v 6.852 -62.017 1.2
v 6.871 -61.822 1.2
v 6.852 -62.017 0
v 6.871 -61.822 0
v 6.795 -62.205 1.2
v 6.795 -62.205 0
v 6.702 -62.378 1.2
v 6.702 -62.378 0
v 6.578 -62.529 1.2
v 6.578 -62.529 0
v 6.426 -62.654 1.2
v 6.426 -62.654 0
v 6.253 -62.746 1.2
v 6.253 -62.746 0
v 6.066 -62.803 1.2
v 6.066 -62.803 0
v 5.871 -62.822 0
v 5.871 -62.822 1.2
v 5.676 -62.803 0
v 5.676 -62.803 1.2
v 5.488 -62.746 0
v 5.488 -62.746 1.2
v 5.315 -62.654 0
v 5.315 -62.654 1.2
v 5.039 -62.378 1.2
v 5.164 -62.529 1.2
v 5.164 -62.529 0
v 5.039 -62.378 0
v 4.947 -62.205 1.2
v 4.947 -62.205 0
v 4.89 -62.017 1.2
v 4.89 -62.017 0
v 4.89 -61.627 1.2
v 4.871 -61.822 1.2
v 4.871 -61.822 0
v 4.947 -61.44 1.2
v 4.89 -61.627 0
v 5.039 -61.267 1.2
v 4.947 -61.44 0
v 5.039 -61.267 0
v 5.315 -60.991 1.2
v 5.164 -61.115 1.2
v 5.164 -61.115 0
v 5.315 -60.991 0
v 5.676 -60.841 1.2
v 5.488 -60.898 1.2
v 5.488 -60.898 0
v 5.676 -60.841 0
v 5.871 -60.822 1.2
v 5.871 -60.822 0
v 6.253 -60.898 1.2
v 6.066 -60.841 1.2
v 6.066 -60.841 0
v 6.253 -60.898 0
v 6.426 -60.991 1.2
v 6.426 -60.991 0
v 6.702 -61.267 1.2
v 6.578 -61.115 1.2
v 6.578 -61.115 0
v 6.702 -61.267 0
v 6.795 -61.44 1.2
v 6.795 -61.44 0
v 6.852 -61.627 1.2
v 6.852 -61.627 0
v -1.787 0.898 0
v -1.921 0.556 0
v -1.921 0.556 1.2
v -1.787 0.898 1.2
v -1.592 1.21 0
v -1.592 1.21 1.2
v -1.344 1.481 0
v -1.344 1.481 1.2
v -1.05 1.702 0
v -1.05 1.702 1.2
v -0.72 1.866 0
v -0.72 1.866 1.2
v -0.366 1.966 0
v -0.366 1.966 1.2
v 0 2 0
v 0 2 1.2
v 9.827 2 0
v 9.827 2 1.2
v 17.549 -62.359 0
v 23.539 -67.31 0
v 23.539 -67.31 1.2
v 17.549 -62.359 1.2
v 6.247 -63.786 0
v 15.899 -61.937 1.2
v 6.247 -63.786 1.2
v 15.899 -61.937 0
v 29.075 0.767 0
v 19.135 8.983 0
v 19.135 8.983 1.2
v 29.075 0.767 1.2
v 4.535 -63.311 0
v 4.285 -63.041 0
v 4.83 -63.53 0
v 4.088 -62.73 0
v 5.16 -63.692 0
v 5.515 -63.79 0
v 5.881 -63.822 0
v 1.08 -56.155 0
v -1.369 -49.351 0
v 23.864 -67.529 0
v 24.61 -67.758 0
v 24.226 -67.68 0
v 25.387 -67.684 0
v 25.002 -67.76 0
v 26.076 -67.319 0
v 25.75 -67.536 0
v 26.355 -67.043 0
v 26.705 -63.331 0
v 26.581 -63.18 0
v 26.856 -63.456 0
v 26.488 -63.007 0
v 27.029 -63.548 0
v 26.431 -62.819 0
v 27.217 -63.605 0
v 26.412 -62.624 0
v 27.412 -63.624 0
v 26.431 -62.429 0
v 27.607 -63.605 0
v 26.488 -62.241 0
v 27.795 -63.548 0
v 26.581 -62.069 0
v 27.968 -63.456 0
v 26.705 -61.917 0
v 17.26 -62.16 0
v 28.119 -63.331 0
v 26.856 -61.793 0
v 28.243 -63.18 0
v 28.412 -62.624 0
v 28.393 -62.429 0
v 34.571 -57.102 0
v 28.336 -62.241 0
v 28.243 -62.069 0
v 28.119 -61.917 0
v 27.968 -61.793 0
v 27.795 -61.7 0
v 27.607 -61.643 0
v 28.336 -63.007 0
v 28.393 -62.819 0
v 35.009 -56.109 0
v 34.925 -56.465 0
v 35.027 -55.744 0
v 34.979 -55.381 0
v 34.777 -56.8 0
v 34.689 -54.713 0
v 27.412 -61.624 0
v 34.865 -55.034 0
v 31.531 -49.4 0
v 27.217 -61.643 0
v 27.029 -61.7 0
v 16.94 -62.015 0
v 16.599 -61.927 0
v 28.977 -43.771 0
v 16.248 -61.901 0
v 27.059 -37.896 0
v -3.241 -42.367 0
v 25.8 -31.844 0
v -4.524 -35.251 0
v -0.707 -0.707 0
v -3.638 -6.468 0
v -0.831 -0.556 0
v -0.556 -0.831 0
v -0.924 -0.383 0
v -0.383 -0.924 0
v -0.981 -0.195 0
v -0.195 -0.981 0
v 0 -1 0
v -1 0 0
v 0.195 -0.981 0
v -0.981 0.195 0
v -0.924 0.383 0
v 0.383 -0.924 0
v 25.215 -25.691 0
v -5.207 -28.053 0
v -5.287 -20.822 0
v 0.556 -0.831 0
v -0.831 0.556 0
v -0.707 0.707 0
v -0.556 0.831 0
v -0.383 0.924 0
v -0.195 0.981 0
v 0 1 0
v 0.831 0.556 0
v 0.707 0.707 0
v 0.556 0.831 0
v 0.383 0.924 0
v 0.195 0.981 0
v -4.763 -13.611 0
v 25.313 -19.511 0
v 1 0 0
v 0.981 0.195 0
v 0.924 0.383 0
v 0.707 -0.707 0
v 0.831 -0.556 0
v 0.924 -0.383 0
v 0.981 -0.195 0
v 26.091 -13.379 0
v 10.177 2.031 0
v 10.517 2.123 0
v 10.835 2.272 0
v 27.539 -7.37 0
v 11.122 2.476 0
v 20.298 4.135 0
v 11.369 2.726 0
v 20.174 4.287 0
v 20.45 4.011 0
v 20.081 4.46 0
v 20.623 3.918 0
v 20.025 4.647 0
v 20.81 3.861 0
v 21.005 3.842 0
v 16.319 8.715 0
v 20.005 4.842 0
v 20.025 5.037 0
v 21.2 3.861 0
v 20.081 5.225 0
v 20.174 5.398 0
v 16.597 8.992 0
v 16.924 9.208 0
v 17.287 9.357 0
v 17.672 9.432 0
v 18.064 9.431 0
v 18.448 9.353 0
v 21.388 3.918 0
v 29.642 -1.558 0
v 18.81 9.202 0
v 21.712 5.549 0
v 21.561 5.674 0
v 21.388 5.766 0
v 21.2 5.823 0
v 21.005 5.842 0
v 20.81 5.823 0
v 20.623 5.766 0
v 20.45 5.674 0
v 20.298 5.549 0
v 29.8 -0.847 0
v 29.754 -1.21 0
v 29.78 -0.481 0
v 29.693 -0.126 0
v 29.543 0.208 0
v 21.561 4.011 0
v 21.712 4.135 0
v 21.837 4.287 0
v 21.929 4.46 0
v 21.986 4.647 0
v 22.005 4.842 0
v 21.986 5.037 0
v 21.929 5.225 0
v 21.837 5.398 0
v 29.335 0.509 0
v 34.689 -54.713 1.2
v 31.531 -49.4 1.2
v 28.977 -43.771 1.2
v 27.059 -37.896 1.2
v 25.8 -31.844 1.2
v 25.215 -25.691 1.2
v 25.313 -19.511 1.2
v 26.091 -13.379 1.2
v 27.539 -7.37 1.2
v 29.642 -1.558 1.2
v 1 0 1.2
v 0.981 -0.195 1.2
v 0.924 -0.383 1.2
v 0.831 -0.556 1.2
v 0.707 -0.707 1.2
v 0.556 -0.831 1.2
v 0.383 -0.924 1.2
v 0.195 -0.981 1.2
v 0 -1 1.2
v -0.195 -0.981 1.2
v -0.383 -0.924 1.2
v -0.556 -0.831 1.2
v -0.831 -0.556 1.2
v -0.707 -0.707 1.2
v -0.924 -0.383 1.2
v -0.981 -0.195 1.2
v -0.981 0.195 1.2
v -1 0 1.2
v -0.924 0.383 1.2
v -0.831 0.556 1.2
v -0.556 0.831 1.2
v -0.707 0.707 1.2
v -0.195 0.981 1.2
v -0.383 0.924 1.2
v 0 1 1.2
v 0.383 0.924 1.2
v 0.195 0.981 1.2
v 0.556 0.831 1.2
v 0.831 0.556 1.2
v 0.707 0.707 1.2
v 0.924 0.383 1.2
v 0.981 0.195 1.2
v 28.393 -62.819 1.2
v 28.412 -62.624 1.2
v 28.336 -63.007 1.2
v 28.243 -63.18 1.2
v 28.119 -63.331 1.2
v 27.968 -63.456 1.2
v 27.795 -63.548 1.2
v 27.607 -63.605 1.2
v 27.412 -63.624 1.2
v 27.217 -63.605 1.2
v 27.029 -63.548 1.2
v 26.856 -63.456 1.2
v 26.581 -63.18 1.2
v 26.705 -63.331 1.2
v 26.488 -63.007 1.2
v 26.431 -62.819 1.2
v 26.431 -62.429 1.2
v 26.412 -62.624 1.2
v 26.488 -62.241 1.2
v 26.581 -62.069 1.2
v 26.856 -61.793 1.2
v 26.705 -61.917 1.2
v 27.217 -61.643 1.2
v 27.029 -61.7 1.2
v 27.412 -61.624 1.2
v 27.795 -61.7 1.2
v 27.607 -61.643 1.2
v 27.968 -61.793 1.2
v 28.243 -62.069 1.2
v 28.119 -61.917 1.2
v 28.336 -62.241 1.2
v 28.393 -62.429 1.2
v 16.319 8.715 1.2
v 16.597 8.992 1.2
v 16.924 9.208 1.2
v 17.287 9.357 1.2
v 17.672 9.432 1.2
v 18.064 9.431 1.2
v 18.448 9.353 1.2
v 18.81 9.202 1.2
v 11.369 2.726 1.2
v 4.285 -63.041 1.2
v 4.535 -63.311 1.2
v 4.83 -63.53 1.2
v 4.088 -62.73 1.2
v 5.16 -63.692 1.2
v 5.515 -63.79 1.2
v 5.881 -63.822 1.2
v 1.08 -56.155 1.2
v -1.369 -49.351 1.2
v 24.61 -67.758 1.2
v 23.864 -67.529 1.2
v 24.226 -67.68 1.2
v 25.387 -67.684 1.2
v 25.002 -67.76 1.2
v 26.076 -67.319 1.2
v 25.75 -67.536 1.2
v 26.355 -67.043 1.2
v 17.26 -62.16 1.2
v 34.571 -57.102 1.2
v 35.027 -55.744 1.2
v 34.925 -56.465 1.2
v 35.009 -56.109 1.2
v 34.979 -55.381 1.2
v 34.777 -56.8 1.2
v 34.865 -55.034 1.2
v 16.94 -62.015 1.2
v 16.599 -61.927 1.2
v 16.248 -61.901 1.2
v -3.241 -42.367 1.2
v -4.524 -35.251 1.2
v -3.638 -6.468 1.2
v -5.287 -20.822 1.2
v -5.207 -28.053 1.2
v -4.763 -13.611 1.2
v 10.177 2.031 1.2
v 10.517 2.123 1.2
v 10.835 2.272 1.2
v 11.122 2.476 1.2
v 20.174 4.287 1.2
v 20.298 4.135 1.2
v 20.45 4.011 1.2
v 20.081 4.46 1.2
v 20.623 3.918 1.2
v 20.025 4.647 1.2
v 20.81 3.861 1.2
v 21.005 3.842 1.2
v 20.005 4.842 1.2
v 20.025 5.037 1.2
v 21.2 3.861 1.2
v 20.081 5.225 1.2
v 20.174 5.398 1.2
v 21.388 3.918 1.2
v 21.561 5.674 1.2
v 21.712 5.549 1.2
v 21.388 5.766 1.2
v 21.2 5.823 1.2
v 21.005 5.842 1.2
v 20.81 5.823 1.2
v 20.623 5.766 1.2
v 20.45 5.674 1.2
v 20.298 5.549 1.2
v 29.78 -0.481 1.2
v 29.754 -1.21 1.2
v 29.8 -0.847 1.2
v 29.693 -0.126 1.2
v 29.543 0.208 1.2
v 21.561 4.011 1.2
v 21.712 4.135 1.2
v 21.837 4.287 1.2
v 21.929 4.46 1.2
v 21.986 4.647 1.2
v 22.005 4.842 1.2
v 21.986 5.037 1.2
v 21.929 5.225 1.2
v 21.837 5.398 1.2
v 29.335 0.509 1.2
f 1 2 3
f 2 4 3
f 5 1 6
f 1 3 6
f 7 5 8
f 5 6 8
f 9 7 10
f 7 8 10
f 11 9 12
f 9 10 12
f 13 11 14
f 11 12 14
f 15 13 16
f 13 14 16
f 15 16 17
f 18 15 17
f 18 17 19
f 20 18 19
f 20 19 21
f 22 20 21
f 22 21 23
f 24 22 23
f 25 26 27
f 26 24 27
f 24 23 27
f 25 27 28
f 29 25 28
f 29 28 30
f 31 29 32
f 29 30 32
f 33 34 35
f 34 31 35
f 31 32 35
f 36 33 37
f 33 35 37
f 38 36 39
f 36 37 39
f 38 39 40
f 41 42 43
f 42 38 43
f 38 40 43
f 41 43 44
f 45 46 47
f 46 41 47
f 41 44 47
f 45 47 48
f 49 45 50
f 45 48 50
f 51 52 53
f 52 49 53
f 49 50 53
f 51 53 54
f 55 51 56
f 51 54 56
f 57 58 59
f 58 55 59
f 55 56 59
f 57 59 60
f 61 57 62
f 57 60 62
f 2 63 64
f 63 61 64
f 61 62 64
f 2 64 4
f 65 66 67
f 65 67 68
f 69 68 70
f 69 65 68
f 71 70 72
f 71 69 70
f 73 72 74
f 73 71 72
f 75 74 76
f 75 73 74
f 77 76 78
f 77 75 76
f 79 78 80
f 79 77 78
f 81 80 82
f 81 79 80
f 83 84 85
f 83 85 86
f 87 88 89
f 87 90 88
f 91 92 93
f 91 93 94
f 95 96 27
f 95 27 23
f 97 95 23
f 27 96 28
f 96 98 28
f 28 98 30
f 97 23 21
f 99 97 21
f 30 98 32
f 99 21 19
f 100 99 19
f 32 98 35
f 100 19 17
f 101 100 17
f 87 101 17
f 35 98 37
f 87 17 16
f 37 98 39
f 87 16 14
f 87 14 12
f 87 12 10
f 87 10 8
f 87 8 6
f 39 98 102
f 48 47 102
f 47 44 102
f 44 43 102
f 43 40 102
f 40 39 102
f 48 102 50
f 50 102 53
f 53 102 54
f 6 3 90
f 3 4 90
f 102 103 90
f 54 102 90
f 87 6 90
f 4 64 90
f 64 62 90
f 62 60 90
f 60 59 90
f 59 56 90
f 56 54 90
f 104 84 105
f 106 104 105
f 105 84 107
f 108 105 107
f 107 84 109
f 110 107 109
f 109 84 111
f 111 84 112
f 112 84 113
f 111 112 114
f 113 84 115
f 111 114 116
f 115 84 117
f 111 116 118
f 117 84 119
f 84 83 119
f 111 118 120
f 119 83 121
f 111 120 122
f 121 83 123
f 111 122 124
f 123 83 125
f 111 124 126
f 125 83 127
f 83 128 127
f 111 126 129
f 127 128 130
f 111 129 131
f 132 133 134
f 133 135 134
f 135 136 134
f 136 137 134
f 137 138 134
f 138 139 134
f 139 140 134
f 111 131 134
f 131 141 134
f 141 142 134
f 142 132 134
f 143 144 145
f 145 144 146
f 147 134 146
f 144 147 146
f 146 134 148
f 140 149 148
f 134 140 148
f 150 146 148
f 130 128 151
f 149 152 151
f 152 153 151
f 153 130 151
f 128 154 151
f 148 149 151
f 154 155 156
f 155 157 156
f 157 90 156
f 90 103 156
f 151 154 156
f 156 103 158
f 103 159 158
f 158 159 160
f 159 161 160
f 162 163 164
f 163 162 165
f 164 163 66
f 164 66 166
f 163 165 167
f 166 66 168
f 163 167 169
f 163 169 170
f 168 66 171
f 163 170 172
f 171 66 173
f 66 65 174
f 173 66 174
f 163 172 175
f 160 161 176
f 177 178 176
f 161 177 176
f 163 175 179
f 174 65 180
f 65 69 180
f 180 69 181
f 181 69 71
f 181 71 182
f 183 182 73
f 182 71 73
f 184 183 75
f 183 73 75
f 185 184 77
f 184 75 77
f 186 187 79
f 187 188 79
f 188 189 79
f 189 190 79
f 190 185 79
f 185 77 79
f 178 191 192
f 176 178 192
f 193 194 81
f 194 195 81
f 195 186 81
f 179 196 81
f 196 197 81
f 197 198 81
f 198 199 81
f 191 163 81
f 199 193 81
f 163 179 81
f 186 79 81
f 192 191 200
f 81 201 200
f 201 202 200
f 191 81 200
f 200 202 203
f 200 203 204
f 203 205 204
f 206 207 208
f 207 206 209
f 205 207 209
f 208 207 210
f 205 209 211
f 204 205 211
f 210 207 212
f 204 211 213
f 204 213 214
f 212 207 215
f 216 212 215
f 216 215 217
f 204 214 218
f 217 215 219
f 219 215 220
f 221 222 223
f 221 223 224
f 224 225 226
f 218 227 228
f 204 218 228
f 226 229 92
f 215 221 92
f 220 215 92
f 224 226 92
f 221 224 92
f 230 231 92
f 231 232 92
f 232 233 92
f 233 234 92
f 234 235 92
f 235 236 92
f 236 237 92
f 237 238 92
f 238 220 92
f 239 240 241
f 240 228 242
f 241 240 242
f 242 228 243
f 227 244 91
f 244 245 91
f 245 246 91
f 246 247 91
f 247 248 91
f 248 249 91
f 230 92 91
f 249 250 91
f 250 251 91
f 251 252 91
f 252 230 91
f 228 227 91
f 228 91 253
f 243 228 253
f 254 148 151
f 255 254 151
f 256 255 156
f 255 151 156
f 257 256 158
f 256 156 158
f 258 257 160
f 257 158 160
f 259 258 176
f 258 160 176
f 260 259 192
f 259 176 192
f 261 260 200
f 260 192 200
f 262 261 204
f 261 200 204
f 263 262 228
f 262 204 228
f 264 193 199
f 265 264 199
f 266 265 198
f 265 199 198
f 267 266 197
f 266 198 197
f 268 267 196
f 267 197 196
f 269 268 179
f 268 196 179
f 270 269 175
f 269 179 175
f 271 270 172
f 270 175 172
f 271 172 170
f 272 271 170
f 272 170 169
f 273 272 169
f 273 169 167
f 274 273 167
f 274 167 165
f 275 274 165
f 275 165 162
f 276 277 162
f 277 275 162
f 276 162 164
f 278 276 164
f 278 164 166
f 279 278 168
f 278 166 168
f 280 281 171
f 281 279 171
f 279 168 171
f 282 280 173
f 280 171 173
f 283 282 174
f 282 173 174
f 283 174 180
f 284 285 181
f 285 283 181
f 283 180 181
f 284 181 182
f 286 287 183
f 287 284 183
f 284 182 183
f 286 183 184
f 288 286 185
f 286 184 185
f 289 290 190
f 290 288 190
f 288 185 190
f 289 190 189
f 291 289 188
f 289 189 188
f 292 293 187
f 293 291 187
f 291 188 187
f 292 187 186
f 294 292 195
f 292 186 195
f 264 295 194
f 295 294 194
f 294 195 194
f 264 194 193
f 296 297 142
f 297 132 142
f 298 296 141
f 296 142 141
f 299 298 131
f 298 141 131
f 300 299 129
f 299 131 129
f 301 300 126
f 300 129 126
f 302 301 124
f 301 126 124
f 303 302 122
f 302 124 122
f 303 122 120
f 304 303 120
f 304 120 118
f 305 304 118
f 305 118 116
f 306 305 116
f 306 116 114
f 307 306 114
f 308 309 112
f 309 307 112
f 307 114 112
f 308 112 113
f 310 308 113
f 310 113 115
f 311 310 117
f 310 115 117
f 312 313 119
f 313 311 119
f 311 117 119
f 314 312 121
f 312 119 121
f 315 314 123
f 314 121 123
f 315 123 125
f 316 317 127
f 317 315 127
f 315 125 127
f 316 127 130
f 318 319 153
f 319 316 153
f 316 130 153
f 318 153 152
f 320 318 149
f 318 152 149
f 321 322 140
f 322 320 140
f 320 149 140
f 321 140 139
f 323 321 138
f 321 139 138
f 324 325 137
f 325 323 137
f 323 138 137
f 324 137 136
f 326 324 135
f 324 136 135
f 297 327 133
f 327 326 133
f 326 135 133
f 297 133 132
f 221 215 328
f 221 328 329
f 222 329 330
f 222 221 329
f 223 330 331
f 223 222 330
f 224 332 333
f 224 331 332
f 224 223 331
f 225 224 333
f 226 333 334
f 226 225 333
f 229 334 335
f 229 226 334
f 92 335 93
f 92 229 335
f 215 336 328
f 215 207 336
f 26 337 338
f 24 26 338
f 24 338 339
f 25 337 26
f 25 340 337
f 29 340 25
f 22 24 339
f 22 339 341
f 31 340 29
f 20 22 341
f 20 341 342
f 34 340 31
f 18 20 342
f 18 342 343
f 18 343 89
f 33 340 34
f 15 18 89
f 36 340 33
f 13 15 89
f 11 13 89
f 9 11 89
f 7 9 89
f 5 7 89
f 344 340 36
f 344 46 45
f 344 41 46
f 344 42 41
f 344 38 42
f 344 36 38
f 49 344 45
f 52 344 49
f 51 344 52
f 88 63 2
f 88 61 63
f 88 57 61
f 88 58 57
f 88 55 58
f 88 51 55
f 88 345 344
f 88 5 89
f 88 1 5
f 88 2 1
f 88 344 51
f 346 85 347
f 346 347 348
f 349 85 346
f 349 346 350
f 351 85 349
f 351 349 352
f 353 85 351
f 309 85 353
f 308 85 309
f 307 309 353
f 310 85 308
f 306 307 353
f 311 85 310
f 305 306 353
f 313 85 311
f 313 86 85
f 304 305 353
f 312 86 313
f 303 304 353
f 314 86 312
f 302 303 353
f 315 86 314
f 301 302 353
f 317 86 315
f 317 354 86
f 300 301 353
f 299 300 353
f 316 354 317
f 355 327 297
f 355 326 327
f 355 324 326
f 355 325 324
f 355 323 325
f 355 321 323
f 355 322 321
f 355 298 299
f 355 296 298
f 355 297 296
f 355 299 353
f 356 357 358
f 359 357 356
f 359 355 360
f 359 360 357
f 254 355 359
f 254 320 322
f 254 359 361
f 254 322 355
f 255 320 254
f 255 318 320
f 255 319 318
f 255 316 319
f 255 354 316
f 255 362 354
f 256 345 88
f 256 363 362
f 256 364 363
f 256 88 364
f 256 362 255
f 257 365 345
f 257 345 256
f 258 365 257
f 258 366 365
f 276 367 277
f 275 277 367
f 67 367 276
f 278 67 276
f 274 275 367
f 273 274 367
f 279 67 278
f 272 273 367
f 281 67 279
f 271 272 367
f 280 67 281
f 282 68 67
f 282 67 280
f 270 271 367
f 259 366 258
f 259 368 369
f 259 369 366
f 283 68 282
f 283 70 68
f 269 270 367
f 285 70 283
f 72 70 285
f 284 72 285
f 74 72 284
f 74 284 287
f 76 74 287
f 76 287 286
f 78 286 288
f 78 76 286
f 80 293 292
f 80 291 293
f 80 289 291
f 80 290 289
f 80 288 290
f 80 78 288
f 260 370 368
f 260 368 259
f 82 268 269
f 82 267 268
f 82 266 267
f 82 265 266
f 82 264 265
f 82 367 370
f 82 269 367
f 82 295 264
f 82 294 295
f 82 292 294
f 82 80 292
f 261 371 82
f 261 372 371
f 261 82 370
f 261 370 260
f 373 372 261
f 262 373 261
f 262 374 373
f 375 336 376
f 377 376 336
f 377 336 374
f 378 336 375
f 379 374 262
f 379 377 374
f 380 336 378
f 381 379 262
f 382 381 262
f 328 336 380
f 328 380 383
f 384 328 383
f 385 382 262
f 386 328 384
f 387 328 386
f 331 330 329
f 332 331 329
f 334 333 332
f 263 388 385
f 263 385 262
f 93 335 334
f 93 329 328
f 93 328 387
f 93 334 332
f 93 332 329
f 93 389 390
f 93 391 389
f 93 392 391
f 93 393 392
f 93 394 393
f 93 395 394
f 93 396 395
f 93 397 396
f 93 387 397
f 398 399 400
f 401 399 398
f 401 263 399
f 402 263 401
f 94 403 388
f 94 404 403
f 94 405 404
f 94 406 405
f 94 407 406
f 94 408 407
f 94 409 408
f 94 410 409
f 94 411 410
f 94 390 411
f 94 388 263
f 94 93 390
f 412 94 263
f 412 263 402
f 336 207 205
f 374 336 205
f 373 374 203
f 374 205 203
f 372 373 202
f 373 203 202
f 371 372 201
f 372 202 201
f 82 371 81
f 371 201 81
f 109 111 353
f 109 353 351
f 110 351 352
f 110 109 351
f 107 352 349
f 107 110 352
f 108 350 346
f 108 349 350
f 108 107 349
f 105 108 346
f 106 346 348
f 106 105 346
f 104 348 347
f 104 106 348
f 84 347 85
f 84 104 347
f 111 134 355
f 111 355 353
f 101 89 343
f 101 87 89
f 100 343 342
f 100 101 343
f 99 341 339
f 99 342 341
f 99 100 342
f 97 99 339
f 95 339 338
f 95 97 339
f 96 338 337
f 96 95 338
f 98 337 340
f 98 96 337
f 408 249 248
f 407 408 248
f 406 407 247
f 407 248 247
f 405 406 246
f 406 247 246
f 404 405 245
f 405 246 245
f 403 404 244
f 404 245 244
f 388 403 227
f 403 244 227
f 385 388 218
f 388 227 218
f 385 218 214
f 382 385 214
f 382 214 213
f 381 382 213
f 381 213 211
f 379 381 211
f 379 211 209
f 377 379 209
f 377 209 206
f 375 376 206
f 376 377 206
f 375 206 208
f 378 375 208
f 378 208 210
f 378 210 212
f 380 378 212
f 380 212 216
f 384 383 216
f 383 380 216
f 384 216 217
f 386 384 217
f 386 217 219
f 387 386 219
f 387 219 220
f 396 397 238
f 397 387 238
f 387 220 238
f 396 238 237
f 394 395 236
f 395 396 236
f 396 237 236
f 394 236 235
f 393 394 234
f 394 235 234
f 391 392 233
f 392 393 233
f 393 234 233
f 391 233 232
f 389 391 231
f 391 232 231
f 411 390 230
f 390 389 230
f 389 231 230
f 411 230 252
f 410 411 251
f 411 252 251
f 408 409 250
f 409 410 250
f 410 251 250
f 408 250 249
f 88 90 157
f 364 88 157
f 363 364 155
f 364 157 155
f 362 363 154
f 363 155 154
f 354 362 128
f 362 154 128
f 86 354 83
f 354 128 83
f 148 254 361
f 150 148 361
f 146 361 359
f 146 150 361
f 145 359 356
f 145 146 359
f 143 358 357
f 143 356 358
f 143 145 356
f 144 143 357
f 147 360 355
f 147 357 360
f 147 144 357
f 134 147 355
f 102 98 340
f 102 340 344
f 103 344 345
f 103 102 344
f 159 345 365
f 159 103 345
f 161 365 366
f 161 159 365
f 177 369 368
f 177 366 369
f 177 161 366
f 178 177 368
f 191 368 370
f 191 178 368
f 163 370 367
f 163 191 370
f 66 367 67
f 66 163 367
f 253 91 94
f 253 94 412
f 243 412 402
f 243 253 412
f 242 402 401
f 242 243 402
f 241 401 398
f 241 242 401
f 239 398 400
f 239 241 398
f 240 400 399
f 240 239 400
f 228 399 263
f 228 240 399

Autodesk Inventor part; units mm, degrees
ref_plane "YZ Plane" through (0, 0, 0) normal (1, 0, 0) x (0, 1, 0)
ref_plane "XZ Plane" through (0, 0, 0) normal (0, 1, 0) x (-1, 0, 0)
ref_plane "XY Plane" through (0, 0, 0) normal (0, 0, 1) x (1, 0, 0)
sketch "スケッチ1" plane through (0, 0, 0) normal (0, 0, 1) x (1, 0, 0)
  circle A0 centre (21.005288, 4.842186) radius 2
  circle A1 centre (0, 0) radius 2
  circle A2 centre (81.171801, -23.481667) radius 63
  arc A3 (-1.921226, 0.555779) -> (4.088443, -62.729672) centre (81.171801, -23.481667) ccw
  line L0 (0, 2) -> (9.827028, 2)
  line L1 (11.368602, 2.725814) -> (16.319283, 8.715397)
  line L2 (19.135043, 8.982785) -> (29.075493, 0.766521)
  line L3 (8.206239, 4.393532) -> (1.777293, 9.707368)
  line L4 (40.328272, 40.117124) -> (11.021999, 4.660921)
  arc A4 (9.827028, 2) -> (11.368602, 2.725814) centre (9.827028, 4) ccw
  arc A5 (19.135043, 8.982785) -> (16.319283, 8.715397) centre (17.860857, 7.441211) ccw
  arc A6 (29.641669, -1.55804) -> (34.689305, -54.712702) centre (81.171801, -23.481667) ccw
  circle A7 centre (5.870717, -61.822204) radius 2
  circle A8 centre (27.411976, -62.624114) radius 2
  line L5 (81.171801, -23.481667) -> (18.171801, -23.481667)
  line L6 (34.57079, -57.102281) -> (26.354526, -67.042731)
  line L7 (17.573011, -64.325196) -> (53.029214, -93.631469)
  line L8 (17.573011, -64.325196) -> (53.029214, -93.631469)
  line L9 (9.443415, -71.02153) -> (14.757251, -64.592584)
  line L10 (23.538766, -67.310119) -> (17.549183, -62.359438)
  arc A9 (23.538766, -67.310119) -> (26.354526, -67.042731) centre (24.812952, -65.768545) ccw
  line L11 (15.898547, -61.93676) -> (6.247168, -63.786456)
  arc A10 (17.549183, -62.359438) -> (15.898547, -61.93676) centre (16.274997, -63.901012) ccw
  arc A11 (29.641669, -1.55804) -> (29.075493, 0.766521) centre (27.801307, -0.775053) ccw
  arc A12 (34.57079, -57.102281) -> (34.689305, -54.712702) centre (33.029216, -55.828096) ccw
  circle A13 centre (5.870717, -61.822204) radius 1
  circle A14 centre (27.411976, -62.624114) radius 1
  circle A15 centre (21.005288, 4.842186) radius 1
  circle A16 centre (0, 0) radius 1
  point P0 (0, 0)
  point P1 (30.241928, -0.197595)
  point P2 (35.534905, -55.935846)
  dimension "d0" = 1.5
  dimension "d1" = 2
  dimension "d3" = 56
  dimension "d8" = 2
  dimension "d9" = 2
extrude "押し出し1" add sketch "スケッチ1" along normal blind 1.2 contours A0 | A8 | L2 A2 L6 A9 L10 A10 L11 A7 A3 A1 L0 A4 L1 A5 | L2 A11 A6 L5 A2 | L5 A6 A12 L6 A2 | A1 | A7
properties part number "MainMCU_PCB"
